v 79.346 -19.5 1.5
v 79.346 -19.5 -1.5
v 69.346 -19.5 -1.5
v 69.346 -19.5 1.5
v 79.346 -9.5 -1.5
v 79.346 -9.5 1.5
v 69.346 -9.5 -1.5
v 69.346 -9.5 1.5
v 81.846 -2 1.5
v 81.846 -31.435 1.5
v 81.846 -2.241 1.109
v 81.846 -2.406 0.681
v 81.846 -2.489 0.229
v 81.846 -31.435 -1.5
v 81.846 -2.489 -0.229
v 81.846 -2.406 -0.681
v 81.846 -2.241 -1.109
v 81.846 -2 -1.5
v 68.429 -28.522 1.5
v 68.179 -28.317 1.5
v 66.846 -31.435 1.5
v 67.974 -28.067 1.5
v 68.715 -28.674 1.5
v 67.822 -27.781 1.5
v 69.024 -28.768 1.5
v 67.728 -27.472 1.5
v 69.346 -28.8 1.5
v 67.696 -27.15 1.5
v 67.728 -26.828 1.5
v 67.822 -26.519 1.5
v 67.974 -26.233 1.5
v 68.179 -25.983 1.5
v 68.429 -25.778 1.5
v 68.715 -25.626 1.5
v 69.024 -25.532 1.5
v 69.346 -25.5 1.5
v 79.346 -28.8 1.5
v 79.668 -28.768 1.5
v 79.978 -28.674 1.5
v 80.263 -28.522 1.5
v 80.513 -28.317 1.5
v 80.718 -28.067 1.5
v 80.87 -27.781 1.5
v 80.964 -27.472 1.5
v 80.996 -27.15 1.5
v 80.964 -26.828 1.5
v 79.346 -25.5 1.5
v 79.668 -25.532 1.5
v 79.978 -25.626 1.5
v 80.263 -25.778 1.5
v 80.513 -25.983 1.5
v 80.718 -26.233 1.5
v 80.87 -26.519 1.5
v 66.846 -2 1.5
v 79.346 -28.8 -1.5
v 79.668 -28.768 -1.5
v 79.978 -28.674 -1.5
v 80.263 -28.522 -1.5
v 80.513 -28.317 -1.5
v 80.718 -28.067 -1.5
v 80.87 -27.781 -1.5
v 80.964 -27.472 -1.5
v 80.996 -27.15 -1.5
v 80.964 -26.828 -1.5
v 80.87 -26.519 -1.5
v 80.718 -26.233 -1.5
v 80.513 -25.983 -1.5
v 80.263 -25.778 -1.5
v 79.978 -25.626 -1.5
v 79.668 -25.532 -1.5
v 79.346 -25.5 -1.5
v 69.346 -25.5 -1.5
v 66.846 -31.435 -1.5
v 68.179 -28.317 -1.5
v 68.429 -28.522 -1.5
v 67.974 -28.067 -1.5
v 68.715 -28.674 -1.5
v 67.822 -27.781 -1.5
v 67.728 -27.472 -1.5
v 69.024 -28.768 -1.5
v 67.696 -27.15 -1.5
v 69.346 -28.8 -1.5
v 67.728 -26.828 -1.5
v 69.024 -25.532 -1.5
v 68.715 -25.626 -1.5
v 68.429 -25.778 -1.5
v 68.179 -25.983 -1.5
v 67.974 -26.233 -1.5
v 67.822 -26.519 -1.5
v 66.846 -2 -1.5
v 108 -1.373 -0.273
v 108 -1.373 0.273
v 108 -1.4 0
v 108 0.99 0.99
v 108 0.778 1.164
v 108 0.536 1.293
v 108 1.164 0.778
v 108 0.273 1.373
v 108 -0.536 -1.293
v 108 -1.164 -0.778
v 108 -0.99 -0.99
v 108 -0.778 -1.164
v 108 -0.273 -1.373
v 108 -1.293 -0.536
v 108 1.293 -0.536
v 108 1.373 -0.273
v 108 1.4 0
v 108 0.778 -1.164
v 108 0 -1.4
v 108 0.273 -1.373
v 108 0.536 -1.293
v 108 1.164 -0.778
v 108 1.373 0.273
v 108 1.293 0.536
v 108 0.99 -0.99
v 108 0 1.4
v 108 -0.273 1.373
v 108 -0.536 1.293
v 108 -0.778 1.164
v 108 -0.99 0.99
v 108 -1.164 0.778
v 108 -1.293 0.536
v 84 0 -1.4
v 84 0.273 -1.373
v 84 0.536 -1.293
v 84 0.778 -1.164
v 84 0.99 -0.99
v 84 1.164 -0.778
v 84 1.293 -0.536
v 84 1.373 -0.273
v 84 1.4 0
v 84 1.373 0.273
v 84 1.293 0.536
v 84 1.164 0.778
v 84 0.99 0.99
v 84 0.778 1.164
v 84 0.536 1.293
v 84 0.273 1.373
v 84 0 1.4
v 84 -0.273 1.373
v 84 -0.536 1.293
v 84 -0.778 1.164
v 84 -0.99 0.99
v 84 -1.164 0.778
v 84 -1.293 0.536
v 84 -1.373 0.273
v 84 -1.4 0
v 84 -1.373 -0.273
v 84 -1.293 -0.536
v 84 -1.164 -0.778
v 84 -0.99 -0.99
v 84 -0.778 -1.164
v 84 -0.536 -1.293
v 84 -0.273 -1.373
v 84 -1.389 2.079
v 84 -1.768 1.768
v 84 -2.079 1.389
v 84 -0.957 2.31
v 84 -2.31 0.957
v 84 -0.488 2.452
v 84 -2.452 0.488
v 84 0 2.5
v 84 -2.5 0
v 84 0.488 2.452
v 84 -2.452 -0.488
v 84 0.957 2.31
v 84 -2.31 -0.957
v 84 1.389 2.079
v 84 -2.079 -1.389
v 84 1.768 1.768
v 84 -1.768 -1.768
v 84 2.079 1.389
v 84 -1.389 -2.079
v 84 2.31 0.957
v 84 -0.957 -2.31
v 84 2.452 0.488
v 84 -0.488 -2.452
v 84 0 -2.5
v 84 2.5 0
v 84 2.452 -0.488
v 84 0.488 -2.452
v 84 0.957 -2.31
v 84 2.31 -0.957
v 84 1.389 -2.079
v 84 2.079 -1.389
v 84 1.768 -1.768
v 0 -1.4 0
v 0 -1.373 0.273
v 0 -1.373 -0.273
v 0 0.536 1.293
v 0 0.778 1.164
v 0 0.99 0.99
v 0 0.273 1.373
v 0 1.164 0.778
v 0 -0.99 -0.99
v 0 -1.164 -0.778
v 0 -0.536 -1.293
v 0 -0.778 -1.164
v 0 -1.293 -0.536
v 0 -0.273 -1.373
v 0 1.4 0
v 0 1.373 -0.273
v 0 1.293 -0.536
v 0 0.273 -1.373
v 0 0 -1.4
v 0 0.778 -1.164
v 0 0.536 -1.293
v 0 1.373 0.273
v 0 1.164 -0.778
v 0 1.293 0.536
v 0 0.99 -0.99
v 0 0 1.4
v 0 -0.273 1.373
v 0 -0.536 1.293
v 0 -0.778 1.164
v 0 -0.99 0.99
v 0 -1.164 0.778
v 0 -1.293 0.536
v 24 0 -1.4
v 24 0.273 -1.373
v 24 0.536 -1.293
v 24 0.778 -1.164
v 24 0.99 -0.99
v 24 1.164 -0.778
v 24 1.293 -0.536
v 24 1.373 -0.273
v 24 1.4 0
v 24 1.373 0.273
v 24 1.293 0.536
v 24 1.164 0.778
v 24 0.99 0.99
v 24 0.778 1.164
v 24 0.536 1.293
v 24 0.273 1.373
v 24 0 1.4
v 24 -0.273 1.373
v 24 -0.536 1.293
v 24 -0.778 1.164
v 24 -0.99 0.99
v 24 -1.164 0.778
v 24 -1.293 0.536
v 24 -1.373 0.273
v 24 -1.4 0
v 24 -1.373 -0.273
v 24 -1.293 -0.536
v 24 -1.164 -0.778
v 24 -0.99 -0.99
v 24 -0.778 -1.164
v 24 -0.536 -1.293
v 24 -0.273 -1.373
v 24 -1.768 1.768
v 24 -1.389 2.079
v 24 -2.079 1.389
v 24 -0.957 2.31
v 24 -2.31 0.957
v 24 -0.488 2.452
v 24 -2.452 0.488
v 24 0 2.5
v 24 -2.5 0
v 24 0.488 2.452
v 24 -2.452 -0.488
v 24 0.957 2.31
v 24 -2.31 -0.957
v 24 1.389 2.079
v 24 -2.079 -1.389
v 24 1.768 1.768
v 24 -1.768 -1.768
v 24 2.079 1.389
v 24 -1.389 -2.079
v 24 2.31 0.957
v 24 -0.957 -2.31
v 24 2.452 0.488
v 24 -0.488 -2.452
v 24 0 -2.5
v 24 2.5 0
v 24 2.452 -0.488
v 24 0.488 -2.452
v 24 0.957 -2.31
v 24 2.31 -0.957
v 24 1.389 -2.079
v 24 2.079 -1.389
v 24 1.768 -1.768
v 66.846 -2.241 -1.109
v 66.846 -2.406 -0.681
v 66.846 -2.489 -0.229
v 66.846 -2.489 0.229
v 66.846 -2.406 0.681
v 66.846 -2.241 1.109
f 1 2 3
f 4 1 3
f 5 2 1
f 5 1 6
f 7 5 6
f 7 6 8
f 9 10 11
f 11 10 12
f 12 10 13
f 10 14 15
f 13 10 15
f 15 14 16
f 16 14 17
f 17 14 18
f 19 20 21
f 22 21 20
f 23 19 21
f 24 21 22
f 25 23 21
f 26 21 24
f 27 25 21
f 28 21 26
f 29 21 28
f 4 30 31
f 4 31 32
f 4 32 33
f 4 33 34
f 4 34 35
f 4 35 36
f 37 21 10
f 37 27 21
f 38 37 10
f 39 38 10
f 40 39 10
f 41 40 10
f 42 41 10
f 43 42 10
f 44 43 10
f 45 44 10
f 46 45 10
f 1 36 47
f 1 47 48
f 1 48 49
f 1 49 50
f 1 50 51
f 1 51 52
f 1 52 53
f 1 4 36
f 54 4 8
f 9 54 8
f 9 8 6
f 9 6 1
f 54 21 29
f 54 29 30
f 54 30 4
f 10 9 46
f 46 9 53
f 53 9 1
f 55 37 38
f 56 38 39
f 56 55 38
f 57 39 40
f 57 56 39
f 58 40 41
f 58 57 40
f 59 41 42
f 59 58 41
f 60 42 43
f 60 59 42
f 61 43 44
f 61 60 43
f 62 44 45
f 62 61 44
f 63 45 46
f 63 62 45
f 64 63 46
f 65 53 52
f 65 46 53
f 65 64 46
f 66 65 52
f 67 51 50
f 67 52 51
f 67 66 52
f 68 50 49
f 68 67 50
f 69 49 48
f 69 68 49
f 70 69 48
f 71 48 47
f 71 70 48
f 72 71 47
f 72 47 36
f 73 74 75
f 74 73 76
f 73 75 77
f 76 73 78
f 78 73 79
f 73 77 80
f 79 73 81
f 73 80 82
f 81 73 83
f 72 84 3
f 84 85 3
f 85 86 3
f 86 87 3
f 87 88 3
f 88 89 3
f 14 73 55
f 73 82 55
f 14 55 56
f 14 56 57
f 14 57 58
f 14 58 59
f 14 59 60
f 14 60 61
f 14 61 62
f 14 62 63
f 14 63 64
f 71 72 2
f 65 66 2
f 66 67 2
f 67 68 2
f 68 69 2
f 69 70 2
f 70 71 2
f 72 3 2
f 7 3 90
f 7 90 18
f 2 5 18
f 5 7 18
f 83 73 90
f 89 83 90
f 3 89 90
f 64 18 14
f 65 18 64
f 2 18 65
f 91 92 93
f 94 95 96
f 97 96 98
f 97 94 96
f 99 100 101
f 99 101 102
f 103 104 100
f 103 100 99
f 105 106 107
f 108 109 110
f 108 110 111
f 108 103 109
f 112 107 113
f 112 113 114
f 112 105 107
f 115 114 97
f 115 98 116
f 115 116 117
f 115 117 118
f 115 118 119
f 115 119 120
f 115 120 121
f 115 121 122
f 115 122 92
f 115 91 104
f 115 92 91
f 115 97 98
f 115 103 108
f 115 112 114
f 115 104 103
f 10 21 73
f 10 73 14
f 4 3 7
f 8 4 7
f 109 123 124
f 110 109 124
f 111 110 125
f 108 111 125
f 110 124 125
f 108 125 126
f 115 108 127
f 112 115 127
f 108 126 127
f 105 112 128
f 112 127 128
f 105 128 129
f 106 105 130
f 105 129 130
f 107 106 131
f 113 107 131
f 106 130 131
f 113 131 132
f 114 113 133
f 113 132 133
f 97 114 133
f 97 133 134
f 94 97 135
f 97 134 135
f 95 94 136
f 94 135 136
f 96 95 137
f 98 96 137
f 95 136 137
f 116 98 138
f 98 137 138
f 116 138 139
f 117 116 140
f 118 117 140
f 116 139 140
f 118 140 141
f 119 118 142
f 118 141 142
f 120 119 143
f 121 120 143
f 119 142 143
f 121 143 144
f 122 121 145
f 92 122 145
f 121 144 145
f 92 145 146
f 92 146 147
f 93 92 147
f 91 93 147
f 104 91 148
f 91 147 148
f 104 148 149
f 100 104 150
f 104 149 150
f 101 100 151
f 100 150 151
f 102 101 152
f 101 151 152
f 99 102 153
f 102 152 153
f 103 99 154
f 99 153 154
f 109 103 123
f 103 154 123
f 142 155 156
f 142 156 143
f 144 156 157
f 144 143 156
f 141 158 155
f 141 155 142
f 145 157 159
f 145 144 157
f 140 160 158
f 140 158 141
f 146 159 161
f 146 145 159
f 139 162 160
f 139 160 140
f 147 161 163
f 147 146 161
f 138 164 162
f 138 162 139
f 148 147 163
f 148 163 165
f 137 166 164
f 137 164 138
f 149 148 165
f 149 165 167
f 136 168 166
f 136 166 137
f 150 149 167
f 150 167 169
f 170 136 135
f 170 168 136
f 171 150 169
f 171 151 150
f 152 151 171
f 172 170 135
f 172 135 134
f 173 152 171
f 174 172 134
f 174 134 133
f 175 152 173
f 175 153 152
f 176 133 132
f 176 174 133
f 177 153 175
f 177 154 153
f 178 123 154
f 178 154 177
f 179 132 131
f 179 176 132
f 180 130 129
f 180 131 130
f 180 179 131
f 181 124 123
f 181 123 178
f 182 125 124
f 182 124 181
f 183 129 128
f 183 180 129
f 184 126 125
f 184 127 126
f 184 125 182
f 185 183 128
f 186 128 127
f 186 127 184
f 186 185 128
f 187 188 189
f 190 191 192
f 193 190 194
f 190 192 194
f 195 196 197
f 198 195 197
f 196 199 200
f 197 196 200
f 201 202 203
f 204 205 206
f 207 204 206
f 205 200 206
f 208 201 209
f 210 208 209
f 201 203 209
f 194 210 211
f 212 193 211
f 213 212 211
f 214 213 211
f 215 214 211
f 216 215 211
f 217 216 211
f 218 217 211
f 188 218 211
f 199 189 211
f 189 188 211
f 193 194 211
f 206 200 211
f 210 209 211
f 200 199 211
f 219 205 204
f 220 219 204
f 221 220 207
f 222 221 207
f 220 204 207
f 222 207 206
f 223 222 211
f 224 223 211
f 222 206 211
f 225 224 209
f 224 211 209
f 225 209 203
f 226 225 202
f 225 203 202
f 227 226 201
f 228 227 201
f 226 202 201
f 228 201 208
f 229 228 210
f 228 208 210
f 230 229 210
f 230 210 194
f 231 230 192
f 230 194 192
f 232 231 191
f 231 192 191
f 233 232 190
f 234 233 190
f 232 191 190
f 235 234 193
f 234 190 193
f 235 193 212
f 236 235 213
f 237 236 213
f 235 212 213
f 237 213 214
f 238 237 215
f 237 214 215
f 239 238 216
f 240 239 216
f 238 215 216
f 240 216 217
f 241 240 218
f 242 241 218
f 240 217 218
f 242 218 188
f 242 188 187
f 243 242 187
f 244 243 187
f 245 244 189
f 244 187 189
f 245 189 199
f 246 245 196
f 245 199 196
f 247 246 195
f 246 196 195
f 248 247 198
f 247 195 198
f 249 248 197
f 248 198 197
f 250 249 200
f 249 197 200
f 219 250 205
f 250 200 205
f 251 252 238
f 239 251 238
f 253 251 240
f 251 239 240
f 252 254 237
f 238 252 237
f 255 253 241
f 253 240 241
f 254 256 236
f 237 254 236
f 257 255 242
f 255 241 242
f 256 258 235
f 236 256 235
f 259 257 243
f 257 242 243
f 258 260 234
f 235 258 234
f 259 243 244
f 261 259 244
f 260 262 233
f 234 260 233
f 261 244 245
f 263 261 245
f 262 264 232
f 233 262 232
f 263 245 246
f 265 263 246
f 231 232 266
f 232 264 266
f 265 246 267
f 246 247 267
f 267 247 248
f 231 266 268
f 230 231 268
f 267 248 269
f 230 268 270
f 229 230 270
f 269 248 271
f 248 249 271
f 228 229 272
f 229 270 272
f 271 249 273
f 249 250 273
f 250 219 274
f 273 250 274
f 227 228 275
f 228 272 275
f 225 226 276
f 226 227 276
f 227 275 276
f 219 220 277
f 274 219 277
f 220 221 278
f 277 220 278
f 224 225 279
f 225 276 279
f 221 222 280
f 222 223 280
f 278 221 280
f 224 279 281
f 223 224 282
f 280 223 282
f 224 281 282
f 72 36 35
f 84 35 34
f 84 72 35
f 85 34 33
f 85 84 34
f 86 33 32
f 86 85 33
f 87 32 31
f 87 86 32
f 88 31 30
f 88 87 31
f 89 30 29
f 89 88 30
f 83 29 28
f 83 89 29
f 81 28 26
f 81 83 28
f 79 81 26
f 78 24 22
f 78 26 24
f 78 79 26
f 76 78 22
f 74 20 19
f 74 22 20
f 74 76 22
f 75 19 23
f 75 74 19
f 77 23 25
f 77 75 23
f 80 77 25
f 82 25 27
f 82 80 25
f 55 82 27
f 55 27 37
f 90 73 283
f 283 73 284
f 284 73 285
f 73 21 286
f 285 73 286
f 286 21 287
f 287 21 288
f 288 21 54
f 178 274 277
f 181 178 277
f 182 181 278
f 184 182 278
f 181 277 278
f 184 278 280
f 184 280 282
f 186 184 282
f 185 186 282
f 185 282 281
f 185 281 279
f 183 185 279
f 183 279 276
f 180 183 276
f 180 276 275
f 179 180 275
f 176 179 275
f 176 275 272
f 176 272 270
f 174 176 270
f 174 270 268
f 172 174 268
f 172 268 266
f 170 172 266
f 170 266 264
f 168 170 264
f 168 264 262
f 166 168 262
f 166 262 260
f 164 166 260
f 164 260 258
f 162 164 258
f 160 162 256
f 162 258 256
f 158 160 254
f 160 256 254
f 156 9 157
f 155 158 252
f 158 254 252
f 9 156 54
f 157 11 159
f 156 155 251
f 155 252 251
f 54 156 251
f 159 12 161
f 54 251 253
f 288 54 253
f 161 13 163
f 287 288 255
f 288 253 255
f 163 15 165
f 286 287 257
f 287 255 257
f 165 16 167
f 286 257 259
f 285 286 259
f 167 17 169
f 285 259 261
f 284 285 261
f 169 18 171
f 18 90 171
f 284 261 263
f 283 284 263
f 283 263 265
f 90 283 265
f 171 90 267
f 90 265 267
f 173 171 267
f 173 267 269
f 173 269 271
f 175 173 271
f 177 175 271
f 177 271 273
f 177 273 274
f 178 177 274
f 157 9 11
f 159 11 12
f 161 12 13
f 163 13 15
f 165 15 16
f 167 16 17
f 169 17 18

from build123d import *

# Parameters (mm, degrees)
SKETCH1_R                = 1.4
BOSS_EXTRUDE1_DEPTH      = 24
SKETCH2_R                = 2.5
BOSS_EXTRUDE2_DEPTH      = 60
SKETCH3_R                = 1.4
BOSS_EXTRUDE3_DEPTH      = 24
BOSS_EXTRUDE4_DEPTH      = 1.5
BOSS_EXTRUDE4_DEPTH_BACK = 1.5
SKETCH4_W                = 15
SKETCH4_H                = 30
CUT_EXTRUDE1_DEPTH       = 10
CUT_EXTRUDE1_DEPTH_BACK  = 7
SKETCH5_W                = 10
SKETCH5_H                = 10


with BuildPart() as part:
    # Sketch1 → Boss-Extrude1 (new body)
    with BuildSketch(Plane(origin=(0, 0, 0), x_dir=(0, 0, -1), z_dir=(1, 0, 0))):
        Circle(SKETCH1_R)
    extrude(amount=BOSS_EXTRUDE1_DEPTH)

    # Sketch2 → Boss-Extrude2 (add)
    with BuildSketch(Plane(origin=(24, 0, 0), x_dir=(0, 0, -1), z_dir=(1, 0, 0))):
        Circle(SKETCH2_R)
    extrude(amount=BOSS_EXTRUDE2_DEPTH)

    # Sketch3 → Boss-Extrude3 (add)
    with BuildSketch(Plane(origin=(84, 0, 0), x_dir=(0, 0, -1), z_dir=(1, 0, 0))):
        Circle(SKETCH3_R)
    extrude(amount=BOSS_EXTRUDE3_DEPTH)

    # Sketch4 → Boss-Extrude4 (add, two sides: drawn at the far end of the back side and taken through both)
    with BuildSketch(Plane.XY.offset(-BOSS_EXTRUDE4_DEPTH_BACK)):
        with Locations((74.346083047, -16.435117581)):
            Rectangle(SKETCH4_W, SKETCH4_H)
    extrude(amount=BOSS_EXTRUDE4_DEPTH + BOSS_EXTRUDE4_DEPTH_BACK)

    # Sketch5 → Cut-Extrude1 (cut, two sides: drawn at the far end of the back side and taken through both)
    with BuildSketch(Plane(origin=(0, 0, -1.5), x_dir=(-1, 0, 0), z_dir=(0, 0, -1)).offset(-CUT_EXTRUDE1_DEPTH_BACK)):
        with Locations((-74.346083047, -14.5)):
            Rectangle(SKETCH5_W, SKETCH5_H)
        with BuildLine():
            Line((-79.346083047, -25.5), (-69.346083047, -25.5))
            ThreePointArc((-69.346083047, -25.5), (-67.696083047, -27.15), (-69.346083047, -28.8))
            Line((-69.346083047, -28.8), (-79.346083047, -28.8))
            ThreePointArc((-79.346083047, -28.8), (-80.996083047, -27.15), (-79.346083047, -25.5))
        make_face()
    extrude(amount=CUT_EXTRUDE1_DEPTH + CUT_EXTRUDE1_DEPTH_BACK, mode=Mode.SUBTRACT)


solid = part.part
